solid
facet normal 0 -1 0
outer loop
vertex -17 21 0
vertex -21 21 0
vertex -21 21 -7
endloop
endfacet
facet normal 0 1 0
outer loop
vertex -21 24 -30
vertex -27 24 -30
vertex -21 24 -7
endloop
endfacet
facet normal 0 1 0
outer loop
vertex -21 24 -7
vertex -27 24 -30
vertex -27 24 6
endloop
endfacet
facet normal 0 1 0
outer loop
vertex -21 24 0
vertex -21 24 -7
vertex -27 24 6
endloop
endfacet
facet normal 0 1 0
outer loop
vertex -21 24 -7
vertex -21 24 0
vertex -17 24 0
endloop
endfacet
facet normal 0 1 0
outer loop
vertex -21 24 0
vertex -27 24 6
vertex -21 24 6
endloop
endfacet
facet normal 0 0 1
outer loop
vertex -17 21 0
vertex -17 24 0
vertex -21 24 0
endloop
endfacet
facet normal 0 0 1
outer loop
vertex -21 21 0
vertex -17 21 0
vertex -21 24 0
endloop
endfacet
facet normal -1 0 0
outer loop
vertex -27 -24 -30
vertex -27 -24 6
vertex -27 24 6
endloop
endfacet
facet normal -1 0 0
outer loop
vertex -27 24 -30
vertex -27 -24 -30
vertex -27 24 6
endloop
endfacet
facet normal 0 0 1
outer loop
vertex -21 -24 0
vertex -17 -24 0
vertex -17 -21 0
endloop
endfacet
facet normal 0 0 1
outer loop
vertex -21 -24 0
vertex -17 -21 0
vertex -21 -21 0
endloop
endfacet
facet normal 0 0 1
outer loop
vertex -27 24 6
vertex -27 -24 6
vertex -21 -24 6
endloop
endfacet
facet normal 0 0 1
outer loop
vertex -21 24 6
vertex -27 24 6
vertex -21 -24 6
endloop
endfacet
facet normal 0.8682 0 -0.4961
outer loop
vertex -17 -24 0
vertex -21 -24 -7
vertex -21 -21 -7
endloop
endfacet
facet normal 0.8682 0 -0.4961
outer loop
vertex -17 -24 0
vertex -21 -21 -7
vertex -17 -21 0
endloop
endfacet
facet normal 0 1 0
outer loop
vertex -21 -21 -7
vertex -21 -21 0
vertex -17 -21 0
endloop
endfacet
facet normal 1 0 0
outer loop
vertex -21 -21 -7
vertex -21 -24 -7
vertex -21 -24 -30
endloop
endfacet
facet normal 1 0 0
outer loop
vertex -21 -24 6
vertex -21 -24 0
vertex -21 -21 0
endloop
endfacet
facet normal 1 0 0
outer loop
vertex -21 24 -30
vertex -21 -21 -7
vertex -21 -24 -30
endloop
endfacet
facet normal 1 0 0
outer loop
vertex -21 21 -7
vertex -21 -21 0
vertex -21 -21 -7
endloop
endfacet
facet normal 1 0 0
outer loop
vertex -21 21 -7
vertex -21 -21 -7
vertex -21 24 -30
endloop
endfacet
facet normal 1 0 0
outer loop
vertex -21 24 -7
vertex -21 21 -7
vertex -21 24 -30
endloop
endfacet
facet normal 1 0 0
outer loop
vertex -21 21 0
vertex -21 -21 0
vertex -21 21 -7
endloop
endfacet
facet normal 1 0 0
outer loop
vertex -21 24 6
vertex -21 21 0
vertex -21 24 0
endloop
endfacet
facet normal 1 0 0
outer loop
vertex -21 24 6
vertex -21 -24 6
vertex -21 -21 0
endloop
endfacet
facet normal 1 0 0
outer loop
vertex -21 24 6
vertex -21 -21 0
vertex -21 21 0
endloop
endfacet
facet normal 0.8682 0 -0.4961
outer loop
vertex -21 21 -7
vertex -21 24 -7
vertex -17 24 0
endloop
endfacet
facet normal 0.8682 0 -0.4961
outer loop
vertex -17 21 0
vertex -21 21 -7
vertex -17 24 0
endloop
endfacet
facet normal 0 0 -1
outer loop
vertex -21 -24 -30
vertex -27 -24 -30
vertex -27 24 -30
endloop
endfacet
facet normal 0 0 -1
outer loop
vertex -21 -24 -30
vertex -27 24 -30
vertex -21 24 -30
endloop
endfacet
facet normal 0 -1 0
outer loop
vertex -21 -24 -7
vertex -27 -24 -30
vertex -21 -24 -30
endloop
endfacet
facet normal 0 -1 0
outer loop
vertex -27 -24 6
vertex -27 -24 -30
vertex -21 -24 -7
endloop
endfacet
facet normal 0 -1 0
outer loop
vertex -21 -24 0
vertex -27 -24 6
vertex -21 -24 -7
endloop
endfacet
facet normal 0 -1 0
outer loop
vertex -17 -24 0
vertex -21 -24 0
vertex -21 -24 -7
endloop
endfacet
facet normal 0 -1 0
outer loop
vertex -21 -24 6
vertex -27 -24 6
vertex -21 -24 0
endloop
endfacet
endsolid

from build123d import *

# Parameters (mm, degrees)
SKETCH010_W       = 6
SKETCH010_H       = 48
PAD004_DEPTH      = 6
PAD004_DEPTH_BACK = 30
PAD005_DEPTH      = 3


with BuildPart() as part:
    # Sketch010 (on Face1 of Binder007) → Pad004 (new body, two sides)
    with BuildSketch(Plane.XY) as pad004_sk:
        with Locations((-24, 0)):
            Rectangle(SKETCH010_W, SKETCH010_H)
    extrude(amount=PAD004_DEPTH)
    extrude(pad004_sk.sketch, amount=-PAD004_DEPTH_BACK)

    # Sketch011 (on Face3 of Pad004) → Pad005 (join)
    with BuildSketch(Plane.XZ.offset(24)):
        Polygon((-21, 0), (-21, -7), (-17, 0), align=None)
    pad005 = extrude(amount=-PAD005_DEPTH)

    # Mirrored001: Pad005 across XZ
    add(pad005.mirror(Plane.XZ))


solid = part.part
